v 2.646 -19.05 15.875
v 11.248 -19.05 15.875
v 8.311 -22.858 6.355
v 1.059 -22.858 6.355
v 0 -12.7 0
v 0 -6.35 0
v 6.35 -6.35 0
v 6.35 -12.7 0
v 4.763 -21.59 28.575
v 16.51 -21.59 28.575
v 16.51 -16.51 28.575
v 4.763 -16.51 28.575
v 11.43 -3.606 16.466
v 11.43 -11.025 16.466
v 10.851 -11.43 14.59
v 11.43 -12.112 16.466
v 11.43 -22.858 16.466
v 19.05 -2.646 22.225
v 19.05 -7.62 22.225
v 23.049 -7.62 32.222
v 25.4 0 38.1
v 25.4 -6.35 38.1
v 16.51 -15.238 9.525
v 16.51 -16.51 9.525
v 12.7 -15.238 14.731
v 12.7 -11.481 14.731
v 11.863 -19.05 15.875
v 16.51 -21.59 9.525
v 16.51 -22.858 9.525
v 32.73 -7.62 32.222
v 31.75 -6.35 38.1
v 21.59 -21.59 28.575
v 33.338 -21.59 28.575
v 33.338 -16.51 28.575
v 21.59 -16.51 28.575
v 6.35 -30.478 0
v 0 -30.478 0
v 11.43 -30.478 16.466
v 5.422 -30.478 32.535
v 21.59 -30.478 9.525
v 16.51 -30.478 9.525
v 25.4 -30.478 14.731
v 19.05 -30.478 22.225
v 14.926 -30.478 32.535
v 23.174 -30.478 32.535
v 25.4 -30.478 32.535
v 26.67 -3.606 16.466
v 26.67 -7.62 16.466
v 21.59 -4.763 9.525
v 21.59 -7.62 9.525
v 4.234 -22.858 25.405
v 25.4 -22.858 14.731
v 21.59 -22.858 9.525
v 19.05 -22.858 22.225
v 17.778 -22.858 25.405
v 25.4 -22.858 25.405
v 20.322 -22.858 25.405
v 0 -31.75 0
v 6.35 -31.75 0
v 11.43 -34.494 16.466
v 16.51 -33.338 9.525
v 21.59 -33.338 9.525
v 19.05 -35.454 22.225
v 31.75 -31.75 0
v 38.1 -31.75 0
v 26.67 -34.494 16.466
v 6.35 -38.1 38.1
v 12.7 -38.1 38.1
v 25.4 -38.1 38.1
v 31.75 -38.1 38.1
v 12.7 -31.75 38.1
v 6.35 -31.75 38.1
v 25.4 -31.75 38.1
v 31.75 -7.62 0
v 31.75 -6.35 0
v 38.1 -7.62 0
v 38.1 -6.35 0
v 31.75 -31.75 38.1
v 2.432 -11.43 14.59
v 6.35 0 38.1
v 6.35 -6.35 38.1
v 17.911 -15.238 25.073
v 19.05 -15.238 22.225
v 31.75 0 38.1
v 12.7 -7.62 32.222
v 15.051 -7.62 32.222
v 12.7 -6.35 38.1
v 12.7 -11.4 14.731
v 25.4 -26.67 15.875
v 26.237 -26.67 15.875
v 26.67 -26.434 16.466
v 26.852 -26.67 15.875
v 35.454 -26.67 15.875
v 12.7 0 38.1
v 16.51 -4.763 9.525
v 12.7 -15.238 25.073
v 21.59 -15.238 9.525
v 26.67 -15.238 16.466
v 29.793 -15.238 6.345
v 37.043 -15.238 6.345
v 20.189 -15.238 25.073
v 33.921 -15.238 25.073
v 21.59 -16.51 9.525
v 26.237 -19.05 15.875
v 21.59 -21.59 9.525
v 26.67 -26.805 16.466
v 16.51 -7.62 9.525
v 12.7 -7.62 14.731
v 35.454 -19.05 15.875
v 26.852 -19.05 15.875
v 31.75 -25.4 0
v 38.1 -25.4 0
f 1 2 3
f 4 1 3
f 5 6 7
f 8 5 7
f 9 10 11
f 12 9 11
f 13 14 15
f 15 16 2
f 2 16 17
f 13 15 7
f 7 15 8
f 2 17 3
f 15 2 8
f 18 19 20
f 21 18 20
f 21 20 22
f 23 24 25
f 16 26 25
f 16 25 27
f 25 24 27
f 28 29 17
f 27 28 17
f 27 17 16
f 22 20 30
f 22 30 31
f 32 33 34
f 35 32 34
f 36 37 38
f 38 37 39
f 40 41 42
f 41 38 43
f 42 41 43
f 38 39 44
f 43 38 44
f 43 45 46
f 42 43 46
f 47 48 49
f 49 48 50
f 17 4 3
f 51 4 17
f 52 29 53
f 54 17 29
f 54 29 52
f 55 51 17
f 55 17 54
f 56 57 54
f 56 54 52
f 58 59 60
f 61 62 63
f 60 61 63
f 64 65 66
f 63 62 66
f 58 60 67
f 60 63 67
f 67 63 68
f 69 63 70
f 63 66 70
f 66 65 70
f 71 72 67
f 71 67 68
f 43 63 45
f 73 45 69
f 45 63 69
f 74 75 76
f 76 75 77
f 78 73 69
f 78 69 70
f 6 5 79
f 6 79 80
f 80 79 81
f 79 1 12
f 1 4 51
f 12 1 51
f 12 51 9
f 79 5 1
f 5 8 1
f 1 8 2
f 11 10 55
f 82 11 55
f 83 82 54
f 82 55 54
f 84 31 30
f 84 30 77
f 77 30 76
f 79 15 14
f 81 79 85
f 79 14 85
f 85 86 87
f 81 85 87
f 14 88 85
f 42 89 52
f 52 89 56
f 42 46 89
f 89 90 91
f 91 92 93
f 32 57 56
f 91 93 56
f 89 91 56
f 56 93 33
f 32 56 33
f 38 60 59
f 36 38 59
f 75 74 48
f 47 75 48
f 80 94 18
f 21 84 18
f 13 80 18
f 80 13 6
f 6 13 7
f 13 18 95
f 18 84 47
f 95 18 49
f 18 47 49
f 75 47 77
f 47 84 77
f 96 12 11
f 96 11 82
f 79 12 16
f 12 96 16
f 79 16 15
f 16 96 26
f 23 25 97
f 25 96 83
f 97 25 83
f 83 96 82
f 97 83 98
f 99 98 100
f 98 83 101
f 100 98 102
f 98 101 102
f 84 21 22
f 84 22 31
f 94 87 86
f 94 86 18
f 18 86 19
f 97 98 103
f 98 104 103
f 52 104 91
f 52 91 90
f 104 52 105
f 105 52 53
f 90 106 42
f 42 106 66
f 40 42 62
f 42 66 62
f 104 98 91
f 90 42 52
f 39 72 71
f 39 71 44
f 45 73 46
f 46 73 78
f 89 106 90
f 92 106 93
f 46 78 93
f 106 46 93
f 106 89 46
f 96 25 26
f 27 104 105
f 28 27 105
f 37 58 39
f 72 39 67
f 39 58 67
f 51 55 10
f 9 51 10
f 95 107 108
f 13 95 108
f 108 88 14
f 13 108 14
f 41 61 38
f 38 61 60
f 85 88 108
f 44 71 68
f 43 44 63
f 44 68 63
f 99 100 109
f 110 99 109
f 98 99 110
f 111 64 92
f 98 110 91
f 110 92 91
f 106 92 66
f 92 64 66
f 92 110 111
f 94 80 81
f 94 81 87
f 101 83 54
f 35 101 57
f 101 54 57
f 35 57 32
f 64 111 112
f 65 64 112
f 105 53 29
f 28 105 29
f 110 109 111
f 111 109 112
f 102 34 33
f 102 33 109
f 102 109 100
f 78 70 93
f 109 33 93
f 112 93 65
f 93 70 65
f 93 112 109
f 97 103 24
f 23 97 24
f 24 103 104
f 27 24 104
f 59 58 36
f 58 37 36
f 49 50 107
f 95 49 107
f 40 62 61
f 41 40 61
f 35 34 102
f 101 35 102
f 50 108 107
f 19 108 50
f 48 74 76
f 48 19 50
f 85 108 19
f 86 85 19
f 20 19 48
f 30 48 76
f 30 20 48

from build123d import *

# Parameters (mm, degrees)
F0_W      = 38.1
F0_H      = 38.1
F1_DEPTH  = 38.1
F6_DEPTH  = 38.1
F8_DEPTH  = 38.1
F9_W      = 25.4
F9_H      = 7.617908
F9_H_2    = 7.62
F10_DEPTH = 38.1


with BuildPart() as f1:
    # F0 (on Front) → F1 (new body)
    with BuildSketch(Plane.XZ):
        with Locations((19.05, 19.05)):
            Rectangle(F0_W, F0_H)
    extrude(amount=F1_DEPTH)

    # F5 (on offset) → F6 (cut)
    with BuildSketch(Plane.YZ.offset(38.1)):
        Polygon((-11.43, 14.589625), (-6.35, 38.1), (-31.75, 38.1), (-26.67, 15.875), (-21.59, 28.575), (-16.51, 28.575), align=None)
        Polygon((-31.75, 0), (-38.1, 38.1), (-38.1, 0), align=None)
        Polygon((-25.4, 0), (-12.7, 0), (-19.05, 15.875), align=None)
        Polygon((-6.35, 0), (0, 0), (0, 38.1), align=None)
    extrude(amount=-F6_DEPTH, mode=Mode.SUBTRACT)

    # F7 (on offset) → F8 (cut)
    with BuildSketch(Plane.XZ.offset(38.1)):
        Polygon((0, 38.1), (0, 0), (6.35, 38.1), align=None)
        Polygon((25.4, 38.1), (12.7, 38.1), (19.05, 22.225), align=None)
        Polygon((11.43, 16.466031), (6.35, 0), (31.75, 0), (26.67, 16.466031), (21.59, 9.525), (16.51, 9.525), align=None)
        Polygon((31.75, 38.1), (38.1, 0), (38.1, 38.1), align=None)
    extrude(amount=-F8_DEPTH, mode=Mode.SUBTRACT)

    # F9 (on offset) → F10 (cut)
    with BuildSketch(Plane.XY.offset(38.1)):
        with Locations((25.4, -11.428954)):
            Rectangle(F9_W, F9_H)
        with Locations((12.7, -26.667908)):
            Rectangle(F9_W, F9_H_2)
    extrude(amount=-F10_DEPTH, mode=Mode.SUBTRACT)


solid = f1.part
